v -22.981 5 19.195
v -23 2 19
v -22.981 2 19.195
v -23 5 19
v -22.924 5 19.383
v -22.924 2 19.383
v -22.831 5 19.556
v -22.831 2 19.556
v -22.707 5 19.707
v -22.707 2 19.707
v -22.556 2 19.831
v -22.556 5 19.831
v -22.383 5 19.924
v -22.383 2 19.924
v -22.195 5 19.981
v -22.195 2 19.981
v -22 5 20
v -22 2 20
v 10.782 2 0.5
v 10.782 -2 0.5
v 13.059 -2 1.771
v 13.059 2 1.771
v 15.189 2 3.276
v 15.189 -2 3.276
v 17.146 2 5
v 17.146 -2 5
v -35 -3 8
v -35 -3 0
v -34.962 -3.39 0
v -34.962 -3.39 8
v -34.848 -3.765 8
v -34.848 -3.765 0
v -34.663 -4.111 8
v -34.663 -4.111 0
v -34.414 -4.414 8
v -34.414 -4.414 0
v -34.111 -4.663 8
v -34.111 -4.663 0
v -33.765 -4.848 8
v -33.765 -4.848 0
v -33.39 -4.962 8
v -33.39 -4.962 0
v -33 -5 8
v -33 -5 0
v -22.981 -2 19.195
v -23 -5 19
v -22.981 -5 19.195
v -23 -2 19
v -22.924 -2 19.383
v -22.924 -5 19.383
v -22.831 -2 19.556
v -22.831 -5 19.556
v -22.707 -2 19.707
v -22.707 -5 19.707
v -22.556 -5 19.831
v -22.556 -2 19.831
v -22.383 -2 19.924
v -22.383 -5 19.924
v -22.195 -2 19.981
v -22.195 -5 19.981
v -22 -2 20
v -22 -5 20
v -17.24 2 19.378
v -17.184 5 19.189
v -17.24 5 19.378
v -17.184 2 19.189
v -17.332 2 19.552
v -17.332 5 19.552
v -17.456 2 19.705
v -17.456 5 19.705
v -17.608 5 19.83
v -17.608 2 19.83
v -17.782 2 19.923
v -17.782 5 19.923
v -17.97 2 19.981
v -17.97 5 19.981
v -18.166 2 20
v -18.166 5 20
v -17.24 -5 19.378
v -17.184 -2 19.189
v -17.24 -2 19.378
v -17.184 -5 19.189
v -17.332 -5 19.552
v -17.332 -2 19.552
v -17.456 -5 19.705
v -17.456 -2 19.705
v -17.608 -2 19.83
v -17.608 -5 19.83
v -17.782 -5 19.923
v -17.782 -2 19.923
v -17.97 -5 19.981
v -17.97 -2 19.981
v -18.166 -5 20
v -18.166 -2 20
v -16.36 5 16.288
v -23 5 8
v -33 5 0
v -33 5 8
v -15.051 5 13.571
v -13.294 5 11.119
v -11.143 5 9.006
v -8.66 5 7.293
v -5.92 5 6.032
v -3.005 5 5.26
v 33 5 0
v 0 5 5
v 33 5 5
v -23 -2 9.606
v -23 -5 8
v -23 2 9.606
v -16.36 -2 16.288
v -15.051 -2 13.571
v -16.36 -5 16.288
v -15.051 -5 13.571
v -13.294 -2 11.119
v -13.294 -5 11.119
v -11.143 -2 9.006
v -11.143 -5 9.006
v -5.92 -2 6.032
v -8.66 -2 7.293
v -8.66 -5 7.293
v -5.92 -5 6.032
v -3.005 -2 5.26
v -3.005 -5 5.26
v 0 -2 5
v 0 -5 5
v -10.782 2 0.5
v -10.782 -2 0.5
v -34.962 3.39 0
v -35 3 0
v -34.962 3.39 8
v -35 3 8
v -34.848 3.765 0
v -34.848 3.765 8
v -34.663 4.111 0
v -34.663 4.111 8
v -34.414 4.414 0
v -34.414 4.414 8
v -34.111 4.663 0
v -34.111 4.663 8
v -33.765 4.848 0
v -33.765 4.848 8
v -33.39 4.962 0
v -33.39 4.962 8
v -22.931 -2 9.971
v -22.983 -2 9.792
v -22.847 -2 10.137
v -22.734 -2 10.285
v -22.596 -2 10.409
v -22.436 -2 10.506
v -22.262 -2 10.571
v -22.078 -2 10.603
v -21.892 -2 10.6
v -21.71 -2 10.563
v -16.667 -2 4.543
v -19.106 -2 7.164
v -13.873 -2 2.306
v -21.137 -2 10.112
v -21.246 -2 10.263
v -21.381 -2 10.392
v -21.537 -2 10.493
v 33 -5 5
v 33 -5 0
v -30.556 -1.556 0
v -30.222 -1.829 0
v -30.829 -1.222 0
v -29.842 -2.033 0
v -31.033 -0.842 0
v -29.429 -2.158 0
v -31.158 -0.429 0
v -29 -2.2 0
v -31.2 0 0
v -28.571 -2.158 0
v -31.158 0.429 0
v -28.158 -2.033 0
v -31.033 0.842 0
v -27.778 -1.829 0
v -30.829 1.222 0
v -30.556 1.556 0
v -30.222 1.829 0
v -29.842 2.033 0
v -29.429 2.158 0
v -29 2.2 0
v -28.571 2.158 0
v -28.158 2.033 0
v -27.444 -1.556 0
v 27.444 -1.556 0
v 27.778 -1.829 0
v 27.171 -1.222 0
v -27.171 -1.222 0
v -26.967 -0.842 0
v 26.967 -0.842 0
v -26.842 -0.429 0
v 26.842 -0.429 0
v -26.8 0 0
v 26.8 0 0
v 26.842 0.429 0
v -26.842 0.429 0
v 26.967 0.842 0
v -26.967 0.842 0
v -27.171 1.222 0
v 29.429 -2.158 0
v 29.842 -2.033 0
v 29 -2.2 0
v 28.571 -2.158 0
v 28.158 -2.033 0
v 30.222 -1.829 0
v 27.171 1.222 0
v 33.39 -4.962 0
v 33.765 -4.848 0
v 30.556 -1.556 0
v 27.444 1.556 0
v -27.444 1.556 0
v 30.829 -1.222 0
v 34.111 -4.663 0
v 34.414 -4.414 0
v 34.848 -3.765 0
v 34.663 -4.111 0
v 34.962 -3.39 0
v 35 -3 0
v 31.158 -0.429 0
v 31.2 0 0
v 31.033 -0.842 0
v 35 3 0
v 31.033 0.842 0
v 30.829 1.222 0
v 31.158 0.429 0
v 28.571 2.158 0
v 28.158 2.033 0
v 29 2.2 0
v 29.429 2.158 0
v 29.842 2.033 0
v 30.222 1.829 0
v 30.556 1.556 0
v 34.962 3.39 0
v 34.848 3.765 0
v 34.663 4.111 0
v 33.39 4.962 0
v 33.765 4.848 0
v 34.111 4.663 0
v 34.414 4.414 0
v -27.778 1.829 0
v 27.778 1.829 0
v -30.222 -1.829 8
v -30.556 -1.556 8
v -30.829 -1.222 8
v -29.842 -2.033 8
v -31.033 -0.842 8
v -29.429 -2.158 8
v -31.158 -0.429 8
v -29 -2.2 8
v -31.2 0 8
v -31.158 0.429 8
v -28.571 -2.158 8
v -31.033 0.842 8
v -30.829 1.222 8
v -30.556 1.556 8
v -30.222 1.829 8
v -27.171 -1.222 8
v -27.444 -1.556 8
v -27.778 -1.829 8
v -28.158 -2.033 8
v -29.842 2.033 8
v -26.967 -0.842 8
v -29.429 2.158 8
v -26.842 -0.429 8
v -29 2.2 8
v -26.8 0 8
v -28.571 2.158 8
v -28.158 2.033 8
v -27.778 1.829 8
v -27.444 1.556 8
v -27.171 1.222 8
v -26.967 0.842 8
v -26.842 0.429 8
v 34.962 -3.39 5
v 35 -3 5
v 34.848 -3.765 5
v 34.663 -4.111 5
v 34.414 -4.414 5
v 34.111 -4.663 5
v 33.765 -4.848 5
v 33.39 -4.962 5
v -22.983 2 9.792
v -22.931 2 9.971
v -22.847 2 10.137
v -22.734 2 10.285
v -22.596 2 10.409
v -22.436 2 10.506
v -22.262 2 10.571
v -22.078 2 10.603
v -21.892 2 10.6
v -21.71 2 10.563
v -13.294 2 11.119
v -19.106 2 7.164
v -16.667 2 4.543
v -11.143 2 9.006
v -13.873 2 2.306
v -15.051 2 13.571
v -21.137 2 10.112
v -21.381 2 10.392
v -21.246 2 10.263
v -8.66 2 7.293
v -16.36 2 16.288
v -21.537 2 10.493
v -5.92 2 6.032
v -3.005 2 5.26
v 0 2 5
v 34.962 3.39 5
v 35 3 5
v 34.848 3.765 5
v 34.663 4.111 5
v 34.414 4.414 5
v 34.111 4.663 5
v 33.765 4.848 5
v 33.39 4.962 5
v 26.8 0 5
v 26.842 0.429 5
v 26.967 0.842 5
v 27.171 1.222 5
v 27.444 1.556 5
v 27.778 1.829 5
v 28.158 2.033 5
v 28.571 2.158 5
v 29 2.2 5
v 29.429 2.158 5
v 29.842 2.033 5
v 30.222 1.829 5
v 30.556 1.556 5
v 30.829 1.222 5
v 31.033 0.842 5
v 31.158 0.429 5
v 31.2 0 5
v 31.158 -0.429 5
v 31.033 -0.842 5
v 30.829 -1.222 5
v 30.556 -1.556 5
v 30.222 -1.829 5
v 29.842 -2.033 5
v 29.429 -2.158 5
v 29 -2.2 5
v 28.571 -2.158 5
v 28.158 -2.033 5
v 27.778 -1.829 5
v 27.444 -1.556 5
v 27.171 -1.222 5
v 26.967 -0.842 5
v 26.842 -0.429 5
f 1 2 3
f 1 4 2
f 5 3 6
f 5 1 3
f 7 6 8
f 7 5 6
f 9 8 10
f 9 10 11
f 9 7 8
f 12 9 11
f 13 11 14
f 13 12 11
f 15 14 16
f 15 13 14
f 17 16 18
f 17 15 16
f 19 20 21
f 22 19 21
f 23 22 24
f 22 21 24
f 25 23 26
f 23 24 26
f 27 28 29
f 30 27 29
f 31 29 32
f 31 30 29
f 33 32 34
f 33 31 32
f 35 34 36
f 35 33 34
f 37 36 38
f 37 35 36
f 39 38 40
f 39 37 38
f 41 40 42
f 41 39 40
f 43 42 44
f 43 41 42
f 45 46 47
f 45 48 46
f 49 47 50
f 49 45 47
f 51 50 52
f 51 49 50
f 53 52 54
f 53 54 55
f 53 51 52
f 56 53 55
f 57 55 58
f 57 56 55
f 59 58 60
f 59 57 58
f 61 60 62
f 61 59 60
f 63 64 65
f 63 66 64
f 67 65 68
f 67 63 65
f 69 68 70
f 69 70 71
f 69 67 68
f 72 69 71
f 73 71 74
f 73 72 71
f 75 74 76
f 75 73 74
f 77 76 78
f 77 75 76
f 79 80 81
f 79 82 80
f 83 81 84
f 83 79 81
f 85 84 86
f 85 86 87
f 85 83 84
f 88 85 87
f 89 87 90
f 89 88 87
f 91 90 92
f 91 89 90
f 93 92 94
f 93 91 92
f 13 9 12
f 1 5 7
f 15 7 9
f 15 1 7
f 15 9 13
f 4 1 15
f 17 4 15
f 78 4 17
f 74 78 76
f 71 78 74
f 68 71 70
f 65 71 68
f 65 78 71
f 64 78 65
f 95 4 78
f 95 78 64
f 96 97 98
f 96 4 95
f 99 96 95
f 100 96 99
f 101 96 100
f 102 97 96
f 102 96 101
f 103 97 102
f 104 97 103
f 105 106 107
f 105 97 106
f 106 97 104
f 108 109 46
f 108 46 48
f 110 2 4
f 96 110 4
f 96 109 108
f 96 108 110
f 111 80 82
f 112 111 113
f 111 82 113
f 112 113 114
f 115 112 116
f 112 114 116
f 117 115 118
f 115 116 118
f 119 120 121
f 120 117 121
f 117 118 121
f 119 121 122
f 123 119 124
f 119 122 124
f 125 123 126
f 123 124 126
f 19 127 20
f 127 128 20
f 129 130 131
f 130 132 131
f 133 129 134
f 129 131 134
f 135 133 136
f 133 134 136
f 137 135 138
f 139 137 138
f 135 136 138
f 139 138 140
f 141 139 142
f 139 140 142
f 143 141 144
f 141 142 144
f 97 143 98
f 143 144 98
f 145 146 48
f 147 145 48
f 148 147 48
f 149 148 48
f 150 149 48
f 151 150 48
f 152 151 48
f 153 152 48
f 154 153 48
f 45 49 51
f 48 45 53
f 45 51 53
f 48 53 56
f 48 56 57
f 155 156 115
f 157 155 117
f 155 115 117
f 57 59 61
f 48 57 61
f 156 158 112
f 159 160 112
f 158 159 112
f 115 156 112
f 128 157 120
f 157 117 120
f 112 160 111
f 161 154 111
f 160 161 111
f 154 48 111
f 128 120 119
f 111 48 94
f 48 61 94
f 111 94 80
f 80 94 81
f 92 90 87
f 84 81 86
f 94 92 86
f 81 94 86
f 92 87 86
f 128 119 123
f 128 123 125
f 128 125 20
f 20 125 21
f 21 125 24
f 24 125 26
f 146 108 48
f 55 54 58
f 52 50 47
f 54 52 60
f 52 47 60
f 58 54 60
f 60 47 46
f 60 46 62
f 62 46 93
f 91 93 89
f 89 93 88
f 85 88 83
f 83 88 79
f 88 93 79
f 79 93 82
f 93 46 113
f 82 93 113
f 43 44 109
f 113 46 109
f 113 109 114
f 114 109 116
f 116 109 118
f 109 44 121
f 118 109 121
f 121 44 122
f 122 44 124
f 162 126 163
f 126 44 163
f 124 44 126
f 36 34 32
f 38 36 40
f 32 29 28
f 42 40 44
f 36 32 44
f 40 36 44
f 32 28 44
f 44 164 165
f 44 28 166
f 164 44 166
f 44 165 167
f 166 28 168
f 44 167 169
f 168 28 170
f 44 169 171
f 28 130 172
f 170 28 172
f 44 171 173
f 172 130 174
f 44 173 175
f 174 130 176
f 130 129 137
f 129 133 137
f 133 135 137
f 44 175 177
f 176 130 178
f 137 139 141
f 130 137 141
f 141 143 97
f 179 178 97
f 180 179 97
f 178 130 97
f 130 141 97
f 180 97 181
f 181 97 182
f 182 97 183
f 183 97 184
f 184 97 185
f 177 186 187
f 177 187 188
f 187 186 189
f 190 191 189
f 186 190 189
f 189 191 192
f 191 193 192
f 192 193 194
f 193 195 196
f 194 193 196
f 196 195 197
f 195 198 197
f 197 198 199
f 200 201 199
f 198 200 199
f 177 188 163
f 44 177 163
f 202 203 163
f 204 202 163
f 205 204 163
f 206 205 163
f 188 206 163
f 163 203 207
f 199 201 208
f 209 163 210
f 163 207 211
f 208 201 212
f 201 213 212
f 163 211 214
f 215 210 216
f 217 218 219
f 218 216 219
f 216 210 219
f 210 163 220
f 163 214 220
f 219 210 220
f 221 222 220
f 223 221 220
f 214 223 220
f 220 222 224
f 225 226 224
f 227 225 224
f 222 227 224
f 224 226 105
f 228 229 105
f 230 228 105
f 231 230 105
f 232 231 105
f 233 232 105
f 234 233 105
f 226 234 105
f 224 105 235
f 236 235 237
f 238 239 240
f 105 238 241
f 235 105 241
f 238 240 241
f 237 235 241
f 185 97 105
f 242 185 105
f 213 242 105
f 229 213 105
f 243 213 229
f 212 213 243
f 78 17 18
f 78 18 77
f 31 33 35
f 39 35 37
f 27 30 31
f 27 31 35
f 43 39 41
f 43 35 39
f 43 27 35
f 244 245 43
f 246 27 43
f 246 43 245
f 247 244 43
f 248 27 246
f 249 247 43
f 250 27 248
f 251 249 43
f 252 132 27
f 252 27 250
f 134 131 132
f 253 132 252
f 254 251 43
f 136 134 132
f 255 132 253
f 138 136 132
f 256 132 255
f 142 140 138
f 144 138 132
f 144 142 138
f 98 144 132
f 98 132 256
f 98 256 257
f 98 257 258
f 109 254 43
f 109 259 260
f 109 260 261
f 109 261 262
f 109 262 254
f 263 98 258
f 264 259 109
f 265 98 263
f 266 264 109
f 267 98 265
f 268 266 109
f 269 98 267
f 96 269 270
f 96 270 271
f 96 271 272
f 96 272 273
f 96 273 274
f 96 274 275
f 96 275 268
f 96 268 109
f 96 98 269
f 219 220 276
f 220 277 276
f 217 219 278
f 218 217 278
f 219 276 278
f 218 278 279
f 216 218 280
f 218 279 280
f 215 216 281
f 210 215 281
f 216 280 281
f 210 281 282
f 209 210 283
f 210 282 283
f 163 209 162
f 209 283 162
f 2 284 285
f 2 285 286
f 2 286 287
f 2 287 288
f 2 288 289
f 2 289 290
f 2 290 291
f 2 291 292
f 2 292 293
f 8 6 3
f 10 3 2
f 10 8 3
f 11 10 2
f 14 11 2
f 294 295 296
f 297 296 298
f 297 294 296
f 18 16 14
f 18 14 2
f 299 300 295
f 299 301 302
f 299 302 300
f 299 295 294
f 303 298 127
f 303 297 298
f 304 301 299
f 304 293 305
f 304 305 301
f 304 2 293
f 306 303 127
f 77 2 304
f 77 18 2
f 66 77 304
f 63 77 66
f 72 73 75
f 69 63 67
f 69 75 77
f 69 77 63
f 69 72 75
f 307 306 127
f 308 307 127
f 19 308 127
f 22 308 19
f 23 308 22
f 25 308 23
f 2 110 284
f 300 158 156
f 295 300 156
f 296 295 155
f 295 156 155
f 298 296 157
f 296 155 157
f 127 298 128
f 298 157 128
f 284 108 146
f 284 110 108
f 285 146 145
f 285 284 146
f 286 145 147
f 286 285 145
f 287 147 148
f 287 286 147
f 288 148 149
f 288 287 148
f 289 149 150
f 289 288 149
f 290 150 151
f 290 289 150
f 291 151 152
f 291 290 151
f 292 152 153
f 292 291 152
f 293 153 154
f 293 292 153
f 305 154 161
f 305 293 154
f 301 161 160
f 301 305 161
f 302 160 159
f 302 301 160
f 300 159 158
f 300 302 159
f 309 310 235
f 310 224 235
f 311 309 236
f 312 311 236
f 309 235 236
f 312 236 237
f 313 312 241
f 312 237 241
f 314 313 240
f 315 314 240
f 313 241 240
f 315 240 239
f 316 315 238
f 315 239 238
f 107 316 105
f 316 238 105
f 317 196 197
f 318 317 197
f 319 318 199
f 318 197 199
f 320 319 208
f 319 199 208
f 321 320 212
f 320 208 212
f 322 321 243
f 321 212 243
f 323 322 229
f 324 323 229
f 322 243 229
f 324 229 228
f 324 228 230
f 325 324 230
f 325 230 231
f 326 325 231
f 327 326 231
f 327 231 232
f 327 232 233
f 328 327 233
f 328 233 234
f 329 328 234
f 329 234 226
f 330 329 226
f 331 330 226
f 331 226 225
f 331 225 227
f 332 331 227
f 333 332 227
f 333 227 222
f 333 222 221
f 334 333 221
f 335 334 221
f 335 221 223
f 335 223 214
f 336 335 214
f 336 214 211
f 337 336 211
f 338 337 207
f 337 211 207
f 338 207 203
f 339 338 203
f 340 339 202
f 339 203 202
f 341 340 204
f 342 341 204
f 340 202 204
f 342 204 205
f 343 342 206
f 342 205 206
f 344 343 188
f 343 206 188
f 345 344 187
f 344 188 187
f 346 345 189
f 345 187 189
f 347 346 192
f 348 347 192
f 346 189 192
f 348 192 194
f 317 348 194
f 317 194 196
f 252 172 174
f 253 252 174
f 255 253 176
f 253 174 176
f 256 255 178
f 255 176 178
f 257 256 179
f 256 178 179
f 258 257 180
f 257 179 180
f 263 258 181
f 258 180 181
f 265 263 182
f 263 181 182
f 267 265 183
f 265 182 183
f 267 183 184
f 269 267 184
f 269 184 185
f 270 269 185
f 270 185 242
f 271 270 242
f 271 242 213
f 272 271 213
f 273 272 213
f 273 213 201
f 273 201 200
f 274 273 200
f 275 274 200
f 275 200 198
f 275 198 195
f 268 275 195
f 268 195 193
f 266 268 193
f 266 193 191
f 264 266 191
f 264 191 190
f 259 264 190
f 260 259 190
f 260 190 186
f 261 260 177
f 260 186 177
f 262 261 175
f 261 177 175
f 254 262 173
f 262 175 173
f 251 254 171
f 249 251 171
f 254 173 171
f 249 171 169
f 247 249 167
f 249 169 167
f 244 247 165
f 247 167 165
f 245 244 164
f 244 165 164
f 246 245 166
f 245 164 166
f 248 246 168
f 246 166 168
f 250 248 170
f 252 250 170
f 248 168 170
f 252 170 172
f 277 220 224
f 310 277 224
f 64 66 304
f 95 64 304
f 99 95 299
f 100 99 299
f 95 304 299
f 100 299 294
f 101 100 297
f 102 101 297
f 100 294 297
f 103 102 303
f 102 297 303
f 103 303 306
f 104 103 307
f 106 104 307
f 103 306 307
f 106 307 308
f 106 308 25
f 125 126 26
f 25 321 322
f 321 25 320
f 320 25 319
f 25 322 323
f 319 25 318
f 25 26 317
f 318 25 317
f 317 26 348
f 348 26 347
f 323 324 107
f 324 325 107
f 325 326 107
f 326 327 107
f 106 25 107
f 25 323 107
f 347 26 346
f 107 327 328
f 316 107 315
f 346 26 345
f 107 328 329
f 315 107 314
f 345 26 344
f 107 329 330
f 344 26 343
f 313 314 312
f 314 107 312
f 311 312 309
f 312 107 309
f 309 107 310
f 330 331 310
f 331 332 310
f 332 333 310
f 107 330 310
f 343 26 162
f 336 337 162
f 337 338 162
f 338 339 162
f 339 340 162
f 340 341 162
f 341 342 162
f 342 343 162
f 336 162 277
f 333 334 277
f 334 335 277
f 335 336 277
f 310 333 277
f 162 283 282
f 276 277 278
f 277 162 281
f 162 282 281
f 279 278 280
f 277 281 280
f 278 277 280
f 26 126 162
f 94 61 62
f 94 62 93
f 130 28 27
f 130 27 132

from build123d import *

# Parameters (mm, degrees)
F0_W     = 70
F0_H     = 10
F1_DEPTH = 8
F2_W     = 58
F2_H     = 10
F3_DEPTH = 12
F5_DEPTH = 7.5
F7_D     = 4.4
F8_DEPTH = 2
F9_R     = 1
F10_R    = 2


with BuildPart() as f1:
    # F0 (on Top) → F1 (new body)
    with BuildSketch(Plane.XY):
        Rectangle(F0_W, F0_H)
    extrude(amount=F1_DEPTH)

    # F2 (on face) → F3 (join)
    with BuildSketch(Plane.XY.offset(8)):
        with Locations((6, 0)):
            Rectangle(F2_W, F2_H)
    extrude(amount=F3_DEPTH)

    # F4 (on Front) → F5 (cut, symmetric)
    with BuildSketch(Plane.XZ):
        with BuildLine():
            ThreePointArc((0, 5), (12.3743686708, 10.1256313292), (17.5, 22.5))
            ThreePointArc((17.5, 22.5), (17.4550693399, 23.7532175939), (17.3205080757, 25))
            ThreePointArc((17.3205080757, 25), (-13.2287565553, 33.9564392374), (0, 5))
        make_face()
        with BuildLine():
            ThreePointArc((17.3205080757, 25), (17.4550693399, 23.7532175939), (17.5, 22.5))
            ThreePointArc((17.5, 22.5), (12.3743686708, 10.1256313292), (0, 5))
            Line((0, 5), (17.1464281995, 5))
            ThreePointArc((17.1464281995, 5), (22.5869153592, 13.0088854945), (24.5, 22.5))
            ThreePointArc((24.5, 22.5), (24.4680079159, 23.7516343834), (24.3721152139, 25))
            Line((24.3721152139, 25), (17.3205080757, 25))
        make_face()
        with BuildLine():
            Line((36.3039560616, 25), (24.3721152139, 25))
            ThreePointArc((24.3721152139, 25), (24.4680079159, 23.7516343834), (24.5, 22.5))
            ThreePointArc((24.5, 22.5), (22.5869153592, 13.0088854945), (17.1464281995, 5))
            Line((17.1464281995, 5), (36.3039560616, 5))
            Line((36.3039560616, 5), (36.3039560616, 25))
        make_face()
    extrude(amount=F5_DEPTH, both=True, mode=Mode.SUBTRACT)

    # F7 (through all)
    with Locations(Plane.XY.offset(8)):
        with Locations((-29, 0), (29, 0)):
            Hole(F7_D / 2)

    # F4 (on Front) → F8 (cut, symmetric)
    with BuildSketch(Plane.XZ):
        with BuildLine():
            ThreePointArc((0, 5), (-13.2287565553, 33.9564392374), (17.3205080757, 25))
            Line((17.3205080757, 25), (24.3721152139, 25))
            ThreePointArc((24.3721152139, 25), (-14.008418473, 42.600104773), (-10.7819293264, 0.5))
            Line((-10.7819293264, 0.5), (10.7819293264, 0.5))
            ThreePointArc((10.7819293264, 0.5), (14.1442846593, 2.4952702724), (17.1464281995, 5))
            Line((17.1464281995, 5), (0, 5))
        make_face()
        with BuildLine():
            ThreePointArc((17.3205080757, 25), (17.4550693399, 23.7532175939), (17.5, 22.5))
            ThreePointArc((17.5, 22.5), (12.3743686708, 10.1256313292), (0, 5))
            Line((0, 5), (17.1464281995, 5))
            ThreePointArc((17.1464281995, 5), (22.5869153592, 13.0088854945), (24.5, 22.5))
            ThreePointArc((24.5, 22.5), (24.4680079159, 23.7516343834), (24.3721152139, 25))
            Line((24.3721152139, 25), (17.3205080757, 25))
        make_face()
    extrude(amount=F8_DEPTH, both=True, mode=Mode.SUBTRACT)

    # F9
    f9_edges = [f1.edges().sort_by_distance(p)[0] for p in [
        (-17.320508, 3.5, 20),
        (-17.320508, -3.5, 20),
        (-23, -3.5, 20),
        (-23, 3.5, 20),
        (-23, 0, 14.059028),
    ]]
    fillet(f9_edges, radius=F9_R)

    # F10
    f10_edges = [f1.edges().sort_by_distance(p)[0] for p in [
        (-35, -5, 4),
        (-35, 5, 4),
        (35, -5, 2.5),
        (35, 5, 2.5),
    ]]
    fillet(f10_edges, radius=F10_R)


solid = f1.part
